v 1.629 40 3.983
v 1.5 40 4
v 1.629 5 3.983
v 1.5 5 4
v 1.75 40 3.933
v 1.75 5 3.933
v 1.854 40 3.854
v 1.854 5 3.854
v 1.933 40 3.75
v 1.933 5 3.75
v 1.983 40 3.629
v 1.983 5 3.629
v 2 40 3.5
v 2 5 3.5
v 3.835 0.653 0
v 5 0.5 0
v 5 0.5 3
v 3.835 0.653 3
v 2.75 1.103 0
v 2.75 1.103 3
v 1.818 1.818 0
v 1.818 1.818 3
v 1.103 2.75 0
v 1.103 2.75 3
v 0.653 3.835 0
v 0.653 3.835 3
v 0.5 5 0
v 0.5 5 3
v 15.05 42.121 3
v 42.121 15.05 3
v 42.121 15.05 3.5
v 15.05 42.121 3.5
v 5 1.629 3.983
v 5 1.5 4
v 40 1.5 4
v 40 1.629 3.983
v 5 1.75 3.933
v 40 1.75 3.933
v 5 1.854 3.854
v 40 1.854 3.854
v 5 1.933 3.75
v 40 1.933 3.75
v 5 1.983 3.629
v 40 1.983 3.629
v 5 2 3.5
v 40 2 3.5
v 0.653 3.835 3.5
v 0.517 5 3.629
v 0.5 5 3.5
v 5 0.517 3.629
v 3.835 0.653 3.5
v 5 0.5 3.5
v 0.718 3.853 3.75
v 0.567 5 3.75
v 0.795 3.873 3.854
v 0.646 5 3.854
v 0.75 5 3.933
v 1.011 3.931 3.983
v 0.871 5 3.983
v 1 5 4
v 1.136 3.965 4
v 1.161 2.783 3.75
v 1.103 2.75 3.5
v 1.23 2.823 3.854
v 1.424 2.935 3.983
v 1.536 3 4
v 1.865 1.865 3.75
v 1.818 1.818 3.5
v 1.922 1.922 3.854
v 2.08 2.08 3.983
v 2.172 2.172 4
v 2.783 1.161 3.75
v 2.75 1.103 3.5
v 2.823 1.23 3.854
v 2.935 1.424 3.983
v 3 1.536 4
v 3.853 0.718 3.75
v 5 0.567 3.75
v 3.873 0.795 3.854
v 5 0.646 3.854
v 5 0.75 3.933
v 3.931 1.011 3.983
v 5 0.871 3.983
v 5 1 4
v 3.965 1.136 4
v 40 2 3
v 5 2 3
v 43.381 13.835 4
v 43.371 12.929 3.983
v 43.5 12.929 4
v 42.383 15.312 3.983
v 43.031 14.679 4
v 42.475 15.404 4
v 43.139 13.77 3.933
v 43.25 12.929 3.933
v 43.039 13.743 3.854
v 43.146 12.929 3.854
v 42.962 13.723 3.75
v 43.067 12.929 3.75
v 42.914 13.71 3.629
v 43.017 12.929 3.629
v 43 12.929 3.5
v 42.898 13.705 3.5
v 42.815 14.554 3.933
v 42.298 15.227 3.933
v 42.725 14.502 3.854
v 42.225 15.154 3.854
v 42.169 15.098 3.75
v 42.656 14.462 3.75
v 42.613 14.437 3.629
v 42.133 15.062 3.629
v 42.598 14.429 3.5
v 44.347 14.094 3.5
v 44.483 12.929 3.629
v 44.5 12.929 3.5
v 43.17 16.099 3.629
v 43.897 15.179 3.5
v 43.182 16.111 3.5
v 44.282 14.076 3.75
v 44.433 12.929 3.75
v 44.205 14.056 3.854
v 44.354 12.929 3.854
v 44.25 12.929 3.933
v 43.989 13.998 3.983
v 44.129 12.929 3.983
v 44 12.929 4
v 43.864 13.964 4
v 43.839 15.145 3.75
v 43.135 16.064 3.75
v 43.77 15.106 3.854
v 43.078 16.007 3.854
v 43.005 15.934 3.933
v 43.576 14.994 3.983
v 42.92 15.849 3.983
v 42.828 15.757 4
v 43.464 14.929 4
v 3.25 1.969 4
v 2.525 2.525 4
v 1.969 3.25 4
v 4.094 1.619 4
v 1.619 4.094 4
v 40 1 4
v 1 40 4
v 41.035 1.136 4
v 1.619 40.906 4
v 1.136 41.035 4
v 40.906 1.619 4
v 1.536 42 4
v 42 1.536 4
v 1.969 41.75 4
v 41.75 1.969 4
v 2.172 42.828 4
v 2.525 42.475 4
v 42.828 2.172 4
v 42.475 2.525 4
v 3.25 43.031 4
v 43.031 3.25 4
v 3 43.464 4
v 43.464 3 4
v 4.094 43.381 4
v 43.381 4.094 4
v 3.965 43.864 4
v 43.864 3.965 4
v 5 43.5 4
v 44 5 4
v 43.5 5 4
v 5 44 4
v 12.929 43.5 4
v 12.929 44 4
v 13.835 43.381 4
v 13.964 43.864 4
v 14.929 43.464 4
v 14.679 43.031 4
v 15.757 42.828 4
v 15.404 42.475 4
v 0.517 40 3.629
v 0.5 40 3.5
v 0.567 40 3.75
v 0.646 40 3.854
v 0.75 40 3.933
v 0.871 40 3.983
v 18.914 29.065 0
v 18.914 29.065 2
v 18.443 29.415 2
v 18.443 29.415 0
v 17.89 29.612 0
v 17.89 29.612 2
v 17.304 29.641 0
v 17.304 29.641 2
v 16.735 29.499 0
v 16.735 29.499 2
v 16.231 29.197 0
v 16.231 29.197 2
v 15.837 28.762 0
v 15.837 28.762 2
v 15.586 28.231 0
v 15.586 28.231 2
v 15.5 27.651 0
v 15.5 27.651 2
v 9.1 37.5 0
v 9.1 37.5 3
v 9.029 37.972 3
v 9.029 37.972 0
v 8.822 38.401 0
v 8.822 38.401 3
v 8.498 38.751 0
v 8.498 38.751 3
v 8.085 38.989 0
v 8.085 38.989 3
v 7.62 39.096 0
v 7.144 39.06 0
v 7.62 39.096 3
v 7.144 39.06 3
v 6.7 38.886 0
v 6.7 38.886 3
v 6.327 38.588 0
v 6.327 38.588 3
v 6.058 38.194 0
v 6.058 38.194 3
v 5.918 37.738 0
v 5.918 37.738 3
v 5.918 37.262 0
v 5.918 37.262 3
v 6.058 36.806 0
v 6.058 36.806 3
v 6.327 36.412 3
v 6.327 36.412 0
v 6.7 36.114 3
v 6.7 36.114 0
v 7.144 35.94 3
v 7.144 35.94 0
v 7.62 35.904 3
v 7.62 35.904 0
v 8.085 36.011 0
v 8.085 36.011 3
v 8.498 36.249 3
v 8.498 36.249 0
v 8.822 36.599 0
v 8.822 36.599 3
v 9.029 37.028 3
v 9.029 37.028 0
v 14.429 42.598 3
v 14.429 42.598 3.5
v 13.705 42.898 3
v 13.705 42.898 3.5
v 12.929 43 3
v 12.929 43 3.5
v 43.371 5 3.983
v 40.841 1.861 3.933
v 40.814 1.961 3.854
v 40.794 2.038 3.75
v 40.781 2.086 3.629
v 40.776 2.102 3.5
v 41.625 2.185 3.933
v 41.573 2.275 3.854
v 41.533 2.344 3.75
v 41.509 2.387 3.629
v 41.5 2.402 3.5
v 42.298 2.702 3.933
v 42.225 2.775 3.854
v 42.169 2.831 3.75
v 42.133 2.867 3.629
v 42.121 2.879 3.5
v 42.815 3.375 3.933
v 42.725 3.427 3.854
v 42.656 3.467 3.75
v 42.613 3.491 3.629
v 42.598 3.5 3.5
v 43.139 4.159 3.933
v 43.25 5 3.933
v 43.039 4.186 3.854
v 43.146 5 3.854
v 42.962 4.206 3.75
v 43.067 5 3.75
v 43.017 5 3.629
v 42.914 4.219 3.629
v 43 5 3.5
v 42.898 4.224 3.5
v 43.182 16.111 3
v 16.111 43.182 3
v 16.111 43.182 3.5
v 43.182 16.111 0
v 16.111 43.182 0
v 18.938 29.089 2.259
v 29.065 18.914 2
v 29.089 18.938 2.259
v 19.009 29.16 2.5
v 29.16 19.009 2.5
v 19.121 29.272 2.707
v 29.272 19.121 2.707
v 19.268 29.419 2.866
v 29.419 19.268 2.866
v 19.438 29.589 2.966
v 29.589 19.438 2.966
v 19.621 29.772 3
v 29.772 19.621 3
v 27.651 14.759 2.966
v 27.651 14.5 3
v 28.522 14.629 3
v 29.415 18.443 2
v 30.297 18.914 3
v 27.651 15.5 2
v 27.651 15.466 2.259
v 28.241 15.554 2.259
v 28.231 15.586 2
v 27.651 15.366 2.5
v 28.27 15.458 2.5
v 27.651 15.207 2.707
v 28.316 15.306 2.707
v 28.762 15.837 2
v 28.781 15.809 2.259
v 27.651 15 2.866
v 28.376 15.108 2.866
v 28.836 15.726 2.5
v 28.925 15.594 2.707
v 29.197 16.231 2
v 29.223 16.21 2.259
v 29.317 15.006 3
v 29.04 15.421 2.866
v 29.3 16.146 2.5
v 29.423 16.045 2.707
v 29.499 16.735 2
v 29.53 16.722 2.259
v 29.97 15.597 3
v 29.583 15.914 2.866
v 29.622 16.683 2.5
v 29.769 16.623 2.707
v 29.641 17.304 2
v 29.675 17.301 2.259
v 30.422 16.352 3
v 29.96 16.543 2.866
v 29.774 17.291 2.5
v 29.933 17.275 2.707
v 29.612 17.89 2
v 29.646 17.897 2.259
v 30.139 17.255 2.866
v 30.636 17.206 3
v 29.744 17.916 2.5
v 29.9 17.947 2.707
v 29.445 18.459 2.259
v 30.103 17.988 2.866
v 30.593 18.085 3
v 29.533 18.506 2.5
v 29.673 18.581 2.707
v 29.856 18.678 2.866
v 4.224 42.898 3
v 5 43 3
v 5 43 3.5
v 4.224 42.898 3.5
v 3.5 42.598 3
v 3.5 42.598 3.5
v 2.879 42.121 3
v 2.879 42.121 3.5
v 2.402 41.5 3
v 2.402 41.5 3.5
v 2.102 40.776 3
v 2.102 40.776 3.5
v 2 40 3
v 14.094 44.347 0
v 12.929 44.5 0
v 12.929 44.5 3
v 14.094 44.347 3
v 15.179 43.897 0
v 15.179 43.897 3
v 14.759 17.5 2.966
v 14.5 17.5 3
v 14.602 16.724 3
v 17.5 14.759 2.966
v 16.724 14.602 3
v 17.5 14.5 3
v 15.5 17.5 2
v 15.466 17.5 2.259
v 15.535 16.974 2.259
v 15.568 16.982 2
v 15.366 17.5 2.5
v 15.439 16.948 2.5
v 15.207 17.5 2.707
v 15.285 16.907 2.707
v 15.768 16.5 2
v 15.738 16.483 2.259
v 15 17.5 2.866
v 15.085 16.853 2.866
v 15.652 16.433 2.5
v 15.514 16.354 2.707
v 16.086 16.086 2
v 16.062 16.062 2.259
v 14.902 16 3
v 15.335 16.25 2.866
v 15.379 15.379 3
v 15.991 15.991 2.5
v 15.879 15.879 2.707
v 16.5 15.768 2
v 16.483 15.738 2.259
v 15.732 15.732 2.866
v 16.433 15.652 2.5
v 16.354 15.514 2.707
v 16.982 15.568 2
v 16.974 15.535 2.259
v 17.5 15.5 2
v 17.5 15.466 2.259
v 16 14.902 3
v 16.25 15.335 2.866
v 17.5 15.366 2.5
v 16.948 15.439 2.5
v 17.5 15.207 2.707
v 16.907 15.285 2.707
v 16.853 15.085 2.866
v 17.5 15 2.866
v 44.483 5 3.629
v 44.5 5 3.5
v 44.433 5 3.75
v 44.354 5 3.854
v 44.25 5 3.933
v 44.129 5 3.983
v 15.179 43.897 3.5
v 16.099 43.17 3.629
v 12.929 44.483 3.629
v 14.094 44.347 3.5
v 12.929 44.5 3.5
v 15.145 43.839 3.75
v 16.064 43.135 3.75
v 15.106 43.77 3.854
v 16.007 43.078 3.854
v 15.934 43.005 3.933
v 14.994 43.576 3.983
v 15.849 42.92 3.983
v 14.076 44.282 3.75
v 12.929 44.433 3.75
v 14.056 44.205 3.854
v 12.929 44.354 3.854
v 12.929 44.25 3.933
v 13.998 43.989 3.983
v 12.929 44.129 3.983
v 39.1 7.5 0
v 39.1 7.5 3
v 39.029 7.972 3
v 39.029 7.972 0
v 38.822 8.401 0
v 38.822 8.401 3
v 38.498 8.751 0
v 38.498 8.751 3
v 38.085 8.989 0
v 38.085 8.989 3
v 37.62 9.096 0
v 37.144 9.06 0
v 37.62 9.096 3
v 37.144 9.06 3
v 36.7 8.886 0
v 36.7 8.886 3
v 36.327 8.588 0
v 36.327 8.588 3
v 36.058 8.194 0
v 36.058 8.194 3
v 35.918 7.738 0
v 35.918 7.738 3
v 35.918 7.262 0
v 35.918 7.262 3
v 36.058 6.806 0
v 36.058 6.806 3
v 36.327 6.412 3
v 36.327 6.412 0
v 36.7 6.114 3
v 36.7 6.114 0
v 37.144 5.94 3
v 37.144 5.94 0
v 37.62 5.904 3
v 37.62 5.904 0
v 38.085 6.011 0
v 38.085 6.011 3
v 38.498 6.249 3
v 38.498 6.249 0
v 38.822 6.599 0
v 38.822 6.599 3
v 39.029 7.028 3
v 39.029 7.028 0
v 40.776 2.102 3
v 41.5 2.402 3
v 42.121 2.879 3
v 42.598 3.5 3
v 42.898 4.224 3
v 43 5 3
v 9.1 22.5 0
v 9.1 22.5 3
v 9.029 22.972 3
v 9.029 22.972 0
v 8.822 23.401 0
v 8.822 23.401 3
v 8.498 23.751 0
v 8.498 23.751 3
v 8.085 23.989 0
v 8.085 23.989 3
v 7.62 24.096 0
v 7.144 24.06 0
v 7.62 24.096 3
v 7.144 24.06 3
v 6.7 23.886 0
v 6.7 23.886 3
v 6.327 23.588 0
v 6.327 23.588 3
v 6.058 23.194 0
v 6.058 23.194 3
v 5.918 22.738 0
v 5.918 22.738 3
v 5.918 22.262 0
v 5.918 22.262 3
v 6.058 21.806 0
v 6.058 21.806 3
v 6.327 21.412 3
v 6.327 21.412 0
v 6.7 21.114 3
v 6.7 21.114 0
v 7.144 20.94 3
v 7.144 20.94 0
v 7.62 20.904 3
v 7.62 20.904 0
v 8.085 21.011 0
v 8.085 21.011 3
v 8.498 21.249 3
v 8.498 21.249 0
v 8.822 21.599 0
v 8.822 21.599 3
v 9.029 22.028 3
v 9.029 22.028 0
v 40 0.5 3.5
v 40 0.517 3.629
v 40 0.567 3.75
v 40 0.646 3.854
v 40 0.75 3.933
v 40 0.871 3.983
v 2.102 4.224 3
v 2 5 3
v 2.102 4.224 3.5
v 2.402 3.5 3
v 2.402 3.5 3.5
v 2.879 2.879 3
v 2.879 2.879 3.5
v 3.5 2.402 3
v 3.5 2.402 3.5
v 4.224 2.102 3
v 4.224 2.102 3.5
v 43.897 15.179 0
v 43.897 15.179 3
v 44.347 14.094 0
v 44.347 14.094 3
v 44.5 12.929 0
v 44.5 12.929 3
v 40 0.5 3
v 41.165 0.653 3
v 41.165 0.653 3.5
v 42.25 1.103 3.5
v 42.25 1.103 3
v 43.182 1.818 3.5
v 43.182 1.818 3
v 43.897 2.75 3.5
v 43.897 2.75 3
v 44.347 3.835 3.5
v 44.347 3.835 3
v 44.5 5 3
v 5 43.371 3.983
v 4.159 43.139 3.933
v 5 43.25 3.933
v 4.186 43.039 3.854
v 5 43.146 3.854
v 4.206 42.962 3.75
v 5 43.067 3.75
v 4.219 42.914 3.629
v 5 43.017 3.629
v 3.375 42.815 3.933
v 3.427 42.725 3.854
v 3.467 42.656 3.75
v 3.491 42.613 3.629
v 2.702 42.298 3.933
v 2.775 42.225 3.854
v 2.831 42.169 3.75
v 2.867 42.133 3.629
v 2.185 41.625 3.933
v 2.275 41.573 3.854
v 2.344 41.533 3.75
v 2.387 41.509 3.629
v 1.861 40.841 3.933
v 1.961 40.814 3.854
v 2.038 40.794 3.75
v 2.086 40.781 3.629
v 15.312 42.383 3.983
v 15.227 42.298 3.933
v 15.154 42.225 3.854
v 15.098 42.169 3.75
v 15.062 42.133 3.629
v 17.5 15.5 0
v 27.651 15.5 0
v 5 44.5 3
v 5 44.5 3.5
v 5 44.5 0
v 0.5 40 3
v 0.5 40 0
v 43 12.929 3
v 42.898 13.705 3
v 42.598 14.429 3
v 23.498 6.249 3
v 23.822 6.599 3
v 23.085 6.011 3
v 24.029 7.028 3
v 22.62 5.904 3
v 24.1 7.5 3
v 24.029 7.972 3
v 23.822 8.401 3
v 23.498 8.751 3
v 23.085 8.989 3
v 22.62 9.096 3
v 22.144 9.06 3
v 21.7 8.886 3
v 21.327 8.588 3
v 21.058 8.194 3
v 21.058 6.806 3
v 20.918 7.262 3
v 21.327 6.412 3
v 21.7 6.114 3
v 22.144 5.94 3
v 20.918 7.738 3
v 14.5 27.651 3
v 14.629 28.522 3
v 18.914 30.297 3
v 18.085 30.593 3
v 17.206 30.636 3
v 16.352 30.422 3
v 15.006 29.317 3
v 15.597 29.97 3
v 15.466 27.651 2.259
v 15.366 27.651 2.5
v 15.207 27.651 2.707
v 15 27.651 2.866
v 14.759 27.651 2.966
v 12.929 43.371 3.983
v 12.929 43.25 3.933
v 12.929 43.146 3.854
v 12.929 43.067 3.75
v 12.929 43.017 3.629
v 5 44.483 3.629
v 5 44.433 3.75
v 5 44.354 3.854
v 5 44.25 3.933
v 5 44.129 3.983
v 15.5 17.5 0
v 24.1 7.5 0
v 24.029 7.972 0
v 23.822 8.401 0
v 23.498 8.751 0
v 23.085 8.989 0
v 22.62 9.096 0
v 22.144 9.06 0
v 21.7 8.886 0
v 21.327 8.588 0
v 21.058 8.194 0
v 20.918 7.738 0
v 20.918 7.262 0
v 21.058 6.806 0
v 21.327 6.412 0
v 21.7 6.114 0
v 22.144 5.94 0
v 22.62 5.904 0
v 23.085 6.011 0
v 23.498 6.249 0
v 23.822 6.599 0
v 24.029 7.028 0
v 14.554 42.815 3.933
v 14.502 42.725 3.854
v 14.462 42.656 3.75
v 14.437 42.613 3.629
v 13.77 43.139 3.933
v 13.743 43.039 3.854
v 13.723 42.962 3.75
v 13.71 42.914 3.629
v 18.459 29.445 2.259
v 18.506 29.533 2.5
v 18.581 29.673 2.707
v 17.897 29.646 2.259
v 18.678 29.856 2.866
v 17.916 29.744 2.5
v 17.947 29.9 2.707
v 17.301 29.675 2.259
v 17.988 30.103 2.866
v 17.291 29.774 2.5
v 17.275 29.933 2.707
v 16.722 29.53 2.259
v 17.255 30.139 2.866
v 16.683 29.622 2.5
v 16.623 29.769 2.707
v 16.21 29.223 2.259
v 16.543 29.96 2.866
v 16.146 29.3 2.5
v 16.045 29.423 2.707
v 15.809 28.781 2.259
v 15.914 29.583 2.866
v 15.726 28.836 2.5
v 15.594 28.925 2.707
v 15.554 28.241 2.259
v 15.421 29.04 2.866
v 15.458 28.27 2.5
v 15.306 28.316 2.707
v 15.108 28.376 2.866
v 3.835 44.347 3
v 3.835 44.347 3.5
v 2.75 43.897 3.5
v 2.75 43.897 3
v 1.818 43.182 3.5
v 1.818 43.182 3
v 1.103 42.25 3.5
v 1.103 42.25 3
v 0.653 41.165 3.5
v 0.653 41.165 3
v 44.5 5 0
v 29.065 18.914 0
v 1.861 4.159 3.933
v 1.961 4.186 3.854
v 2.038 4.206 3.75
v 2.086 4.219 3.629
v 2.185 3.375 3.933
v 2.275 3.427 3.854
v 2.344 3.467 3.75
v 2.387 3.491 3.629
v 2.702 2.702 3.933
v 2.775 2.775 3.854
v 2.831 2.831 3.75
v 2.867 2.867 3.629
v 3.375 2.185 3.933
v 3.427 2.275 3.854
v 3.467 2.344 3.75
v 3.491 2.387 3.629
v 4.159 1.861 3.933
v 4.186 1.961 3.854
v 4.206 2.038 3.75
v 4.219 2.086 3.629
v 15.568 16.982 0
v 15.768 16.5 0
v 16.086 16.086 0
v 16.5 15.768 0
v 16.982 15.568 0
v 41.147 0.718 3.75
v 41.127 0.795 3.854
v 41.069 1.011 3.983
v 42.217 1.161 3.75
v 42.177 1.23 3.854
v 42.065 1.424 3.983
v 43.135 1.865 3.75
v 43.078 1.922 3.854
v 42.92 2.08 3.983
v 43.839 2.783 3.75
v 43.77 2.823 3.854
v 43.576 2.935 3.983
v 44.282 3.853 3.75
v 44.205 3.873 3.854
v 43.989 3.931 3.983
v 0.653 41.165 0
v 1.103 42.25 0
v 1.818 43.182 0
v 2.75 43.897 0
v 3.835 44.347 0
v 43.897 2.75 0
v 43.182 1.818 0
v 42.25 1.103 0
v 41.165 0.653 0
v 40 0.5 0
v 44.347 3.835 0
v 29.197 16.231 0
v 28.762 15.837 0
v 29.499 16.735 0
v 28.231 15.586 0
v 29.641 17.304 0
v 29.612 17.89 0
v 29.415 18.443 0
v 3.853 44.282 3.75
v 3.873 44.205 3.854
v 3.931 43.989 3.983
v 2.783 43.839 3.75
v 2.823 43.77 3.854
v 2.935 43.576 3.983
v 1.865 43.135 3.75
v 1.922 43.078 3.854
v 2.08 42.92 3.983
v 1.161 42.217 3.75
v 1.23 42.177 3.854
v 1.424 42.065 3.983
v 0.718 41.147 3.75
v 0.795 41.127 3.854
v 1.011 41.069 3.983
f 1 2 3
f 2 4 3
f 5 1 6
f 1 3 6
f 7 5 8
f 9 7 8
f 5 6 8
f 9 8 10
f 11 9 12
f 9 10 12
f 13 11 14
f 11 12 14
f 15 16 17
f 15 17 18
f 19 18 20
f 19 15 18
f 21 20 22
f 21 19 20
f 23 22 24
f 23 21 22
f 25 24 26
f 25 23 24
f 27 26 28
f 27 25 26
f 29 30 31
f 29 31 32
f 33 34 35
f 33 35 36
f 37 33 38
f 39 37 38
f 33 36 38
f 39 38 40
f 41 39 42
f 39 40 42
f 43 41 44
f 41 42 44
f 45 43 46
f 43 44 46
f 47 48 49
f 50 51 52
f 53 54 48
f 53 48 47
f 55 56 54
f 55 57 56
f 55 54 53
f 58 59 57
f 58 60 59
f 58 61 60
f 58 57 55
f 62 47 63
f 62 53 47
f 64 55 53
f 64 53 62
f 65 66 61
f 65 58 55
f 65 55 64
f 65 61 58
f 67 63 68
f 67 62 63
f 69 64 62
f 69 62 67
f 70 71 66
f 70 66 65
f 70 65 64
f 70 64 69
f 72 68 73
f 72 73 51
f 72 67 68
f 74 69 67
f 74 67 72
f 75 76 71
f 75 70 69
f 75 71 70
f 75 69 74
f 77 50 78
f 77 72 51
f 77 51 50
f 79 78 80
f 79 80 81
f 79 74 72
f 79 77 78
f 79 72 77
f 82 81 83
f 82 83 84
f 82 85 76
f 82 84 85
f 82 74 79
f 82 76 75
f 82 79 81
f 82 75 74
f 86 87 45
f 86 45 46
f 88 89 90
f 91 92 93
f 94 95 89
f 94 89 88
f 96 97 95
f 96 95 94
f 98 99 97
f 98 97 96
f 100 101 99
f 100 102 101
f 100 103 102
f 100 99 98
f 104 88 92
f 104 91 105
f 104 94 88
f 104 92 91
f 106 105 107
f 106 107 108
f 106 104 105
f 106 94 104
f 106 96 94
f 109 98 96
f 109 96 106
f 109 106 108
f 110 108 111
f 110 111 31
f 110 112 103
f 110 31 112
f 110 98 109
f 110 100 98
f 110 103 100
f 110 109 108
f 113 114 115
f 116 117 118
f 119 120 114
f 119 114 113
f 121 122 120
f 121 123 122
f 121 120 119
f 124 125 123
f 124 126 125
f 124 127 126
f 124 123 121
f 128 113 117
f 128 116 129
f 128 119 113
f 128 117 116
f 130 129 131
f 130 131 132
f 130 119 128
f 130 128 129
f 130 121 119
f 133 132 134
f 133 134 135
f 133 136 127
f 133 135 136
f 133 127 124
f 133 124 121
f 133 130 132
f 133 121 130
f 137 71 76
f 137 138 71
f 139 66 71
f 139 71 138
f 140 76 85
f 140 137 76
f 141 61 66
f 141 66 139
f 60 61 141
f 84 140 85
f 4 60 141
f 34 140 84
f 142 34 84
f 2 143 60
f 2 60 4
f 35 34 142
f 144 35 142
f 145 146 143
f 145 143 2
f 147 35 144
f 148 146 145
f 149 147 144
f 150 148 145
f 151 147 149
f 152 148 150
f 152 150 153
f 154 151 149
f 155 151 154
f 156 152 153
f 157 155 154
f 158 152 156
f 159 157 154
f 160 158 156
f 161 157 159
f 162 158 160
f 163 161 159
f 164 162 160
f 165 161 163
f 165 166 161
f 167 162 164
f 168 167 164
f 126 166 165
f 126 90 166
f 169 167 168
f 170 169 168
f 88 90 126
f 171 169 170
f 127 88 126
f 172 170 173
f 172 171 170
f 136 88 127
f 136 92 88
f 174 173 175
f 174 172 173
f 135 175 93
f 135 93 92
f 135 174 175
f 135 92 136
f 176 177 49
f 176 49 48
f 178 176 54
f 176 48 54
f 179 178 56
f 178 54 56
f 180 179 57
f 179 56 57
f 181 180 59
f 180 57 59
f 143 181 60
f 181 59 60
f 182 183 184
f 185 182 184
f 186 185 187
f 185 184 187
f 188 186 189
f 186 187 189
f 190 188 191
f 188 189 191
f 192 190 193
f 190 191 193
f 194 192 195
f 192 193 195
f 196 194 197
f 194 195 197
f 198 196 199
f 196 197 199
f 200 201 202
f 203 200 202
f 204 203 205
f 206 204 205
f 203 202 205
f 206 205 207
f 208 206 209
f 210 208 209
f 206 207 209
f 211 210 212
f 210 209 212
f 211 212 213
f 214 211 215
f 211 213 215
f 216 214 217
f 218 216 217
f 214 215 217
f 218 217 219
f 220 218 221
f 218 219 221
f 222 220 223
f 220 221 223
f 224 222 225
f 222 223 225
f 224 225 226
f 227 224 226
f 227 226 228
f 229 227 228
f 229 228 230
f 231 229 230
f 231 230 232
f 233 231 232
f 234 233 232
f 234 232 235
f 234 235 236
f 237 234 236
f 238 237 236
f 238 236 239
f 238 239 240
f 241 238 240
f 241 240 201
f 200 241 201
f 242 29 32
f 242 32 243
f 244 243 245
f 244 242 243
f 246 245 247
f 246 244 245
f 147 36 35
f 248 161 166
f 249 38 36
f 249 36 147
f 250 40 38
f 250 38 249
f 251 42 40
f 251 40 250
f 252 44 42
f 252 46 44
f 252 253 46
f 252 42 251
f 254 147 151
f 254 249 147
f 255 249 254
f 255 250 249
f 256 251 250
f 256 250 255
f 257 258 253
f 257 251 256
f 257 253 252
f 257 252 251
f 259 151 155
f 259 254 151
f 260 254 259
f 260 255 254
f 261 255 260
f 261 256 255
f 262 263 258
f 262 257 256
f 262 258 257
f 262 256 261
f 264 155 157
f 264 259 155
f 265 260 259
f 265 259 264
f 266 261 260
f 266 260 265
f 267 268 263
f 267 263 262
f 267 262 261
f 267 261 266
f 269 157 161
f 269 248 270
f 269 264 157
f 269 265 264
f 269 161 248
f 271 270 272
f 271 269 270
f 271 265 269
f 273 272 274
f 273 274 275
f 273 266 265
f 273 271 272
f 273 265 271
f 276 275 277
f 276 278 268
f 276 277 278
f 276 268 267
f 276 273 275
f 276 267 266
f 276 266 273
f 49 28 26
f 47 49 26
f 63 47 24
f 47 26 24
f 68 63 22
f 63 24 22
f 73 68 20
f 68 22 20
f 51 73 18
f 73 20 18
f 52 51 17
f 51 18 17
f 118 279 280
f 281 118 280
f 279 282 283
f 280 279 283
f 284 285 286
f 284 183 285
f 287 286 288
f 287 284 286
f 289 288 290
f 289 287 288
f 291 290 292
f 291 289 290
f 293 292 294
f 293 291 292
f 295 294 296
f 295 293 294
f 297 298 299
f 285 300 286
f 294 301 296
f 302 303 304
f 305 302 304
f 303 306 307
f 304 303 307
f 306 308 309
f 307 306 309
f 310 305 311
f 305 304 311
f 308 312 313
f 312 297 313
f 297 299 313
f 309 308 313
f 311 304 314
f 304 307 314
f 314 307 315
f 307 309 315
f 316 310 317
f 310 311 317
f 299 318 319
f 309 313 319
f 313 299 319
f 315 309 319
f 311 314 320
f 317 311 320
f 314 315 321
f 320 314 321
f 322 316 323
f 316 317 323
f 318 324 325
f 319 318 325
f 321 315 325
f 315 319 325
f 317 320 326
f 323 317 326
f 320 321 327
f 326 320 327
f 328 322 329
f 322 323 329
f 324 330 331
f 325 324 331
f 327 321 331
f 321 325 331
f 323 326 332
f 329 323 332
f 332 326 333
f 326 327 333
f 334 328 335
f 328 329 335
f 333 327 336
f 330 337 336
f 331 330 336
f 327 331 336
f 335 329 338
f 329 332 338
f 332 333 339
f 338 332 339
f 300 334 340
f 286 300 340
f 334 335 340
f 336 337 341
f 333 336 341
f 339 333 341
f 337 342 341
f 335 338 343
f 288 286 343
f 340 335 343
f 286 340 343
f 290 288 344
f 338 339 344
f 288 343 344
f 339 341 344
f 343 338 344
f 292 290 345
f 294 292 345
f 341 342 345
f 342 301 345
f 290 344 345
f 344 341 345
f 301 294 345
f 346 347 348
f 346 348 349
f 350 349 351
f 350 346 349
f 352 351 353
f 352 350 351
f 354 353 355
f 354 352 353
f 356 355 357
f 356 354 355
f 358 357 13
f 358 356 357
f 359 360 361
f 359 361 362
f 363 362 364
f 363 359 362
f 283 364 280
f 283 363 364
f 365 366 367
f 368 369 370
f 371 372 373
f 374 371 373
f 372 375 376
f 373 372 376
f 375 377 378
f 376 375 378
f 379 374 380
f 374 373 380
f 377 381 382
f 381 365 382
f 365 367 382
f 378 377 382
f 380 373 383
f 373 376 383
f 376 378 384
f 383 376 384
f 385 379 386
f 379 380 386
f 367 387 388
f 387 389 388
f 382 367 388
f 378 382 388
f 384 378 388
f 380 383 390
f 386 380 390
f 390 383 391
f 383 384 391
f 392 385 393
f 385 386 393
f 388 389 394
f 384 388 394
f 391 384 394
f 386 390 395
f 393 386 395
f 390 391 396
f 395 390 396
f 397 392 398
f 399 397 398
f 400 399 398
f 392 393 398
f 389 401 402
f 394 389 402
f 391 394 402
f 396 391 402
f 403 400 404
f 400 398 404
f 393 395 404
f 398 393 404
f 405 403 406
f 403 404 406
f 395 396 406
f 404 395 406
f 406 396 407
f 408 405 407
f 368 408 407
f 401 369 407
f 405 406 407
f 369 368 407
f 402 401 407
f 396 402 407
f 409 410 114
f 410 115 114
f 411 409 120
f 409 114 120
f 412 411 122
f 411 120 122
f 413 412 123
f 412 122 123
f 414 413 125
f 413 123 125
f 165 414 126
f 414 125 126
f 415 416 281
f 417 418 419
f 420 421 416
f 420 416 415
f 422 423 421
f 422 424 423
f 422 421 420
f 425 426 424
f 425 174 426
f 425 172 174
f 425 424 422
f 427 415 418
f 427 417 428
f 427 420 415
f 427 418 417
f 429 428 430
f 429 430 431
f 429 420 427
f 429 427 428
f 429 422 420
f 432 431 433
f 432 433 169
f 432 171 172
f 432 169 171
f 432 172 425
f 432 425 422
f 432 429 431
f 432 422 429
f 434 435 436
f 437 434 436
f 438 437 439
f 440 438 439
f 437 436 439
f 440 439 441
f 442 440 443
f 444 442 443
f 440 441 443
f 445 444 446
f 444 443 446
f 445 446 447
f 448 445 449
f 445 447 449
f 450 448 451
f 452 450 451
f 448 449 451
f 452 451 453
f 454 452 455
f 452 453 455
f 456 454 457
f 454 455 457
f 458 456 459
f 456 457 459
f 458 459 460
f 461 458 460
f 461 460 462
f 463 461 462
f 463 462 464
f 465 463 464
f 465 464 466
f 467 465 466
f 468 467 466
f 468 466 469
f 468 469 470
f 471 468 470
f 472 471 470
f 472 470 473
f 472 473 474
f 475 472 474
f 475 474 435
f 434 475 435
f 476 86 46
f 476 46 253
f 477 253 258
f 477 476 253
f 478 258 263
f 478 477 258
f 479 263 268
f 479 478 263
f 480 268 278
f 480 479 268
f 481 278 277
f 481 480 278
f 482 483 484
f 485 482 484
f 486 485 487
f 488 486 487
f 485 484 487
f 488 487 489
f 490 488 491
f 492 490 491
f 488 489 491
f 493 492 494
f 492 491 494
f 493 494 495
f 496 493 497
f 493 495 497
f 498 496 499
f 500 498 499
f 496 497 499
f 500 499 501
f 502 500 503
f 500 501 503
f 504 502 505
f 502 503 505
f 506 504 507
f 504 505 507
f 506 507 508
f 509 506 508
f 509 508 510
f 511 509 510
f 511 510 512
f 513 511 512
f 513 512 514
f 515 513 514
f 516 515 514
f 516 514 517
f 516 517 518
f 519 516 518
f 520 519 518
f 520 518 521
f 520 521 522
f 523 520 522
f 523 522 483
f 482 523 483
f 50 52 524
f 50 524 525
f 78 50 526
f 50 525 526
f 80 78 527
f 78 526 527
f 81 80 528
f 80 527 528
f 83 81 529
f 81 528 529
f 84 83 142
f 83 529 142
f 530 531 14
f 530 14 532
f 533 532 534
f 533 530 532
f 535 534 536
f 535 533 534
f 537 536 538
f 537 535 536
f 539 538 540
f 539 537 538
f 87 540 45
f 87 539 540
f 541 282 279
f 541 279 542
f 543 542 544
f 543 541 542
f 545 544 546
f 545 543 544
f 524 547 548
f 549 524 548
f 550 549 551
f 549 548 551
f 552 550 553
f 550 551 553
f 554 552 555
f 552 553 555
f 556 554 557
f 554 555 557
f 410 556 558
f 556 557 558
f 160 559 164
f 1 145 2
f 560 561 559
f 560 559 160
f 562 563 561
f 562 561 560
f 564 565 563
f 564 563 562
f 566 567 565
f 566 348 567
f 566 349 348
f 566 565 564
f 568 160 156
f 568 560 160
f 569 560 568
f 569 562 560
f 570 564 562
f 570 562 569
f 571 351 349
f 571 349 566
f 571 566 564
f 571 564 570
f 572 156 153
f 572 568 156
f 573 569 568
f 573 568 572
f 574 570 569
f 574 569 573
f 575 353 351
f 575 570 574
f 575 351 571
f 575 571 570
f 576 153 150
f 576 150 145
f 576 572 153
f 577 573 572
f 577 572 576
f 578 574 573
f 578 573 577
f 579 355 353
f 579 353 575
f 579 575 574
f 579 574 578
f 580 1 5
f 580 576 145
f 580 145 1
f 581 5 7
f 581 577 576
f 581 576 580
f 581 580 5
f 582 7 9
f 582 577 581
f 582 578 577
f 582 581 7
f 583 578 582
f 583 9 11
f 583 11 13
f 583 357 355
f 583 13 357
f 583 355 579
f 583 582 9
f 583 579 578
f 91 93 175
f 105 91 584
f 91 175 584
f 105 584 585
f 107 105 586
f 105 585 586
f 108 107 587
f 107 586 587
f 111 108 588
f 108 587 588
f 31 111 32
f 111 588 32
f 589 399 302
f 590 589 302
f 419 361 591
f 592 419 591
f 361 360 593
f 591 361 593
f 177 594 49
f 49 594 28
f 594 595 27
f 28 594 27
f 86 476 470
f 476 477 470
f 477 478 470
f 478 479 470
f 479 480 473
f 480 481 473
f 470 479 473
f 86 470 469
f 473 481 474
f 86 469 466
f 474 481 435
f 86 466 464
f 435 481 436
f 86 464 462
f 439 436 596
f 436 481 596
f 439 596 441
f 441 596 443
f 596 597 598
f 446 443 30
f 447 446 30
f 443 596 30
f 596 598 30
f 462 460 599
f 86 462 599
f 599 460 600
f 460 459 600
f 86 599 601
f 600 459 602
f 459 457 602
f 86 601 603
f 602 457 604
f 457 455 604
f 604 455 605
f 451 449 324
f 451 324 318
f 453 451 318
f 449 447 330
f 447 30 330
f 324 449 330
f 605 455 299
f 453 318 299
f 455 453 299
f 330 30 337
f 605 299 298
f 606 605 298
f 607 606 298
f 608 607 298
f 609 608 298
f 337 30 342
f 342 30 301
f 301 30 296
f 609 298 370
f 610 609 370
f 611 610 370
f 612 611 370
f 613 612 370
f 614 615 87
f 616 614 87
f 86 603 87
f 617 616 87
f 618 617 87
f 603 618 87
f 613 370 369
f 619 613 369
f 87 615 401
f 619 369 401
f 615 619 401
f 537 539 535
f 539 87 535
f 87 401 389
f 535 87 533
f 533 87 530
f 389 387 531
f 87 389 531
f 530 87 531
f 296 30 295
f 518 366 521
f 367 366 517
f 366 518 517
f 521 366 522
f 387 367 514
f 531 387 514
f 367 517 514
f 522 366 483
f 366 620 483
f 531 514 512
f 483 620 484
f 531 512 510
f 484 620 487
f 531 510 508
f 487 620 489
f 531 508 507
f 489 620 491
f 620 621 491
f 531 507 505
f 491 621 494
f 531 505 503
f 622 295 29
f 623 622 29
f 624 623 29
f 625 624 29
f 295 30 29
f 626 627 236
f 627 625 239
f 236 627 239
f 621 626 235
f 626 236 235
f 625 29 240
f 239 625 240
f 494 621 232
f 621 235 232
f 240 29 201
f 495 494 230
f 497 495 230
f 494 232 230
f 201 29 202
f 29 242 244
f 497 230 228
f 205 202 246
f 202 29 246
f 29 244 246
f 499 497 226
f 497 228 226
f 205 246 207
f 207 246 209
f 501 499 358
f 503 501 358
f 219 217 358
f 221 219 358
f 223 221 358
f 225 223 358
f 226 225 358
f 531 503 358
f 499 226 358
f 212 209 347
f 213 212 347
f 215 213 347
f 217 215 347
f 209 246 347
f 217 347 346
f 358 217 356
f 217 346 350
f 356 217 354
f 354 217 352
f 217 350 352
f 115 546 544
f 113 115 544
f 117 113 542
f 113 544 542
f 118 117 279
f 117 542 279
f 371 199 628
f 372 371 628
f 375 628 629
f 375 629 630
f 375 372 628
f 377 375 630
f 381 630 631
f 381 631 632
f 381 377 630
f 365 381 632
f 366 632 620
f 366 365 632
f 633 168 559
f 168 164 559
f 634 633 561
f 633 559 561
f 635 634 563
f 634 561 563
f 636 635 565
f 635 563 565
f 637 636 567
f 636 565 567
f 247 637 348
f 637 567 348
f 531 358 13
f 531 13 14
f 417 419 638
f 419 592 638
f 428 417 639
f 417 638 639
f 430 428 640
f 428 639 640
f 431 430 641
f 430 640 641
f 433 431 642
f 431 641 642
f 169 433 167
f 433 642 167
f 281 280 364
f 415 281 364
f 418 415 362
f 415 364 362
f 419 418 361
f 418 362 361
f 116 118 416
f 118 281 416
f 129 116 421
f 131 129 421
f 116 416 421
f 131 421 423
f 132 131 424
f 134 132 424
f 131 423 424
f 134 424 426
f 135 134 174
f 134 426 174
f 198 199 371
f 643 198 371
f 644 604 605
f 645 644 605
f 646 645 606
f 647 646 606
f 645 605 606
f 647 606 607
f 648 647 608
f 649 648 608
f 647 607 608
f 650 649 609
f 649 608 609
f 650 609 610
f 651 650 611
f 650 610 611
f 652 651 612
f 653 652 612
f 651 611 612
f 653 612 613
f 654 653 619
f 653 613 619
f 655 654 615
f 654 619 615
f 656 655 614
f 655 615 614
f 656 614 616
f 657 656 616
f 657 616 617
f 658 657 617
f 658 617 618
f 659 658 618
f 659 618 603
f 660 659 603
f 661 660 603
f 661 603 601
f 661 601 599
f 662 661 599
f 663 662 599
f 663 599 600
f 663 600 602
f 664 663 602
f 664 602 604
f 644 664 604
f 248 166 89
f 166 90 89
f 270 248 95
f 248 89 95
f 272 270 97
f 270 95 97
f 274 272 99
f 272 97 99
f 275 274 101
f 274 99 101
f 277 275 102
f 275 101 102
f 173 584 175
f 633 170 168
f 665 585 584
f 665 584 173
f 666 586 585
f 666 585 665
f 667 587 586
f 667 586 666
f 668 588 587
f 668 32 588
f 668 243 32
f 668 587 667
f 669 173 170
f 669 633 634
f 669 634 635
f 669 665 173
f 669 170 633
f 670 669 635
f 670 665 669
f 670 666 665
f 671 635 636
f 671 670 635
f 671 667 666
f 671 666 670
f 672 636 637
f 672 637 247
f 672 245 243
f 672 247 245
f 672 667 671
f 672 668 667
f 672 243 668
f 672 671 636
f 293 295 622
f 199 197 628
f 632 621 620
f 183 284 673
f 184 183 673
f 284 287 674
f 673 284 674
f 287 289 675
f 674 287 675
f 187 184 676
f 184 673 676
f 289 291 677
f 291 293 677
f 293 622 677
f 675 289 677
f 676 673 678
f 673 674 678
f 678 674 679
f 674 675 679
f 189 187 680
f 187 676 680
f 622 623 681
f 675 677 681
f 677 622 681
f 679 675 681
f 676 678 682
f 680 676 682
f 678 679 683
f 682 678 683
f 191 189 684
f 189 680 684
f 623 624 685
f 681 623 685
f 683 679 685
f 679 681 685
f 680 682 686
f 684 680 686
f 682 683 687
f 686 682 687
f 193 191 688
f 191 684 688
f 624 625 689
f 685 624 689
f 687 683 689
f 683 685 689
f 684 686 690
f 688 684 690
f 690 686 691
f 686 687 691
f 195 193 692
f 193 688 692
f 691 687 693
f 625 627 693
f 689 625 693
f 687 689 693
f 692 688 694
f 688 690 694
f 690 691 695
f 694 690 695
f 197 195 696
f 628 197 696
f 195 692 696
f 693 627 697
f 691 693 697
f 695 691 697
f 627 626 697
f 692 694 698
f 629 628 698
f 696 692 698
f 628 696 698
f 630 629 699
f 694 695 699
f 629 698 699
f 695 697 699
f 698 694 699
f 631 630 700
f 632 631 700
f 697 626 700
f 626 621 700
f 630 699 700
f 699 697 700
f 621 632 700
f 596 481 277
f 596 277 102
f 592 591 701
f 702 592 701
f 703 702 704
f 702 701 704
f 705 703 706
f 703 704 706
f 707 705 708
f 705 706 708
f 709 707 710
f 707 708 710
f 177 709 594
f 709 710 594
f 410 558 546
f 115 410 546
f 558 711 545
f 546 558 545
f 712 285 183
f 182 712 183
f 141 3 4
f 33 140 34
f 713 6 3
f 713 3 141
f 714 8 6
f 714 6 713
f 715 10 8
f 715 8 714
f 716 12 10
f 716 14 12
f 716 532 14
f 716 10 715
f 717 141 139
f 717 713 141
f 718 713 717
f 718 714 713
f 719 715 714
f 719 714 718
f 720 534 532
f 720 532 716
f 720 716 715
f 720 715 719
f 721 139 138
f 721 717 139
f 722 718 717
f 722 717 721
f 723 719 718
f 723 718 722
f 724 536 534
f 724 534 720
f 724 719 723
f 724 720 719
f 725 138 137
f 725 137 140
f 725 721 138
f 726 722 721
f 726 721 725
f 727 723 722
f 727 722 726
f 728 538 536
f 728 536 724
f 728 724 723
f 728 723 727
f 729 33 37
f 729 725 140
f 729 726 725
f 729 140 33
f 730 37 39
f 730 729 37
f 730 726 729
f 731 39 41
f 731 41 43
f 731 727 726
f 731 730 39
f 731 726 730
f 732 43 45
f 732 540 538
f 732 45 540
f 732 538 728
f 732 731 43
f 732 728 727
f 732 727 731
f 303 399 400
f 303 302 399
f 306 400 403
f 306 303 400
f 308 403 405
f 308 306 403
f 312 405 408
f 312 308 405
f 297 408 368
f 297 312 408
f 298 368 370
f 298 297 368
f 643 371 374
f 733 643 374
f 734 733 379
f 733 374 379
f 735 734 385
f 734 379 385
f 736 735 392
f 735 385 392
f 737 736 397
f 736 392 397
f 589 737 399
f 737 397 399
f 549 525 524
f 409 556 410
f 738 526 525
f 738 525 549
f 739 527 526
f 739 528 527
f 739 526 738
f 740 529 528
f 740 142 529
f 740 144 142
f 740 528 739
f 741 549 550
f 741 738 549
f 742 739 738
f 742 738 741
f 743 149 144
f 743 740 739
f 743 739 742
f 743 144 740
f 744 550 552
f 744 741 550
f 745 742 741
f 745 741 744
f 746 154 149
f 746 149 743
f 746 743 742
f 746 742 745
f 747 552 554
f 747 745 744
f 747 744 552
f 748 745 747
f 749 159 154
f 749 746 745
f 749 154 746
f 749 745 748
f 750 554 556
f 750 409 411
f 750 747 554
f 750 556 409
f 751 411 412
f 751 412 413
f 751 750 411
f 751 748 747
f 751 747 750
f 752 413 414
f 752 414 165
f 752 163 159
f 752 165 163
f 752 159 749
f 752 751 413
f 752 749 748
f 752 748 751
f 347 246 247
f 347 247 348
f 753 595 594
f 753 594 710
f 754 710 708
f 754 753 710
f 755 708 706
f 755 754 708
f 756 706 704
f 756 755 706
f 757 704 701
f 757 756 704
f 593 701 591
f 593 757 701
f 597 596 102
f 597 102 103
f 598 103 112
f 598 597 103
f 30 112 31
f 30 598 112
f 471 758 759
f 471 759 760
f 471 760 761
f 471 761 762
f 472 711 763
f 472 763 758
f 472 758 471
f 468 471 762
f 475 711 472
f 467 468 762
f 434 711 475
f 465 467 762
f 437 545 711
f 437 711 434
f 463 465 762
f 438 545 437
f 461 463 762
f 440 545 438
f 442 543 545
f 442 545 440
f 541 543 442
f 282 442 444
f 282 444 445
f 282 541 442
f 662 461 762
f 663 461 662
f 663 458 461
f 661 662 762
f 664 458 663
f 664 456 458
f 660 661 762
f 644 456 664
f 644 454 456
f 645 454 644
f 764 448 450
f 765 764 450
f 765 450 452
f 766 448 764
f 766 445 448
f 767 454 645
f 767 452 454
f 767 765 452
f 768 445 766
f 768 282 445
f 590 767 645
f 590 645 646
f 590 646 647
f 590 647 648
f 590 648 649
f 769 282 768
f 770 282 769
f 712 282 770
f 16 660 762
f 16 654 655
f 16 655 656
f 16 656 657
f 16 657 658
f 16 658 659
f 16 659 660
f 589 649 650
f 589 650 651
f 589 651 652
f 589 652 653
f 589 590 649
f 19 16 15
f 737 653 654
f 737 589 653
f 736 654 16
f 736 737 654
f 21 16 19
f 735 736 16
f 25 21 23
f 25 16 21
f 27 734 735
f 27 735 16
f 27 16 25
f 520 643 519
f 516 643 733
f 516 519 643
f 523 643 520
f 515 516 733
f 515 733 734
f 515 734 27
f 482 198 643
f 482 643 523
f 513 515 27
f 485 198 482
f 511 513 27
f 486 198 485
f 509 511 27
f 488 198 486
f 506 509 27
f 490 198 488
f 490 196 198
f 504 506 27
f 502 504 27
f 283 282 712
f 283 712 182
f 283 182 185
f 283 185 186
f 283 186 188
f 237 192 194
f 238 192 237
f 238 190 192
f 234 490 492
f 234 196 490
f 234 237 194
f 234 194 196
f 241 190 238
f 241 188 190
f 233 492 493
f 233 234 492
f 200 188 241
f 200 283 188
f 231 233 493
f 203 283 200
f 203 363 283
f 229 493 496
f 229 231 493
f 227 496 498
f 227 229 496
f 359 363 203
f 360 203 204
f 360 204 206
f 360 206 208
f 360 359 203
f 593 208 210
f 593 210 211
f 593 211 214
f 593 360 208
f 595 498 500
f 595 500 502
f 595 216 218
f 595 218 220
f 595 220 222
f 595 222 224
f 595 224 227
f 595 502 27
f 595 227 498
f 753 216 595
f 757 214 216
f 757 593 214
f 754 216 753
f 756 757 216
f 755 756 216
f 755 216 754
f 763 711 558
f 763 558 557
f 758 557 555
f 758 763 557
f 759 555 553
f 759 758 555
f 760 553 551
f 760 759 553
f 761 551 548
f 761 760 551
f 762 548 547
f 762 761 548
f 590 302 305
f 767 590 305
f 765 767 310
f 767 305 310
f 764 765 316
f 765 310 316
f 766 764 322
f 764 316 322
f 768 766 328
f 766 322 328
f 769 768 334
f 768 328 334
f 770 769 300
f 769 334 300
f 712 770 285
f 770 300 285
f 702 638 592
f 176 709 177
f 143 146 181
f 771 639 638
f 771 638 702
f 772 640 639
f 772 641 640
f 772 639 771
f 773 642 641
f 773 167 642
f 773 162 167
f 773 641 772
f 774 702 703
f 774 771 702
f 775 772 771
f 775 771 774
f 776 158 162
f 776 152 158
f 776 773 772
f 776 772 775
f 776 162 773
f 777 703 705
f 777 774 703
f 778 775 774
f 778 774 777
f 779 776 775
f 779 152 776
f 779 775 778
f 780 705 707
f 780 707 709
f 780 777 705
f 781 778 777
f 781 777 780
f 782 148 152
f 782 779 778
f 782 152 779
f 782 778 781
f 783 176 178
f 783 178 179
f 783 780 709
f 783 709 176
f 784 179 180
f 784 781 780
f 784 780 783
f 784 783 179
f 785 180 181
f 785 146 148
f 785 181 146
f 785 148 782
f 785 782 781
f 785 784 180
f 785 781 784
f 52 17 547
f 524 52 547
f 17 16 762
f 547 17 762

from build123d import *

# Parameters (mm, degrees)
BOSS_EXTRUDE1_DEPTH = 3
SKETCH2_R           = 1.6
CUT_EXTRUDE1_DEPTH  = 64.710281745
MOVE_FACE1_BY       = 0.5
MOVE_FACE1_2_BY     = 0.5
MOVE_FACE1_3_BY     = 0.5
MOVE_FACE1_4_BY     = 0.5
MOVE_FACE1_5_BY     = 0.5
MOVE_FACE1_6_BY     = 0.5
MOVE_FACE1_7_BY     = 0.5
MOVE_FACE1_8_BY     = 0.5
MOVE_FACE1_9_BY     = 0.5
MOVE_FACE1_10_BY    = 0.5
BOSS_EXTRUDE2_DEPTH = 1
FILLET1_R           = 0.5
CUT_EXTRUDE2_DEPTH  = 64.003968129
FILLET2_R           = 1


with BuildPart() as part:
    # Sketch1 → Boss-Extrude1 (new body)
    with BuildSketch(Plane.XY):
        with BuildLine():
            Line((16.464466094, 43.535533906), (43.535533906, 16.464466094))
            ThreePointArc((43.535533906, 16.464466094), (44.619397663, 14.84234935), (45, 12.928932188))
            Line((45, 12.928932188), (45, 5))
            ThreePointArc((45, 5), (43.535533906, 1.464466094), (40, 0))
            Line((40, 0), (5, 0))
            ThreePointArc((5, 0), (1.464466094, 1.464466094), (0, 5))
            Line((0, 5), (0, 40))
            ThreePointArc((0, 40), (1.464466094, 43.535533906), (5, 45))
            Line((5, 45), (12.928932188, 45))
            ThreePointArc((12.928932188, 45), (14.84234935, 44.619397663), (16.464466094, 43.535533906))
        make_face()
    extrude(amount=BOSS_EXTRUDE1_DEPTH)

    # Sketch2 → Cut-Extrude1 (cut, through all)
    with BuildSketch(Plane.XY.offset(3)):
        with Locations((7.5, 37.5)):
            Circle(SKETCH2_R)
        with Locations((7.5, 22.5)):
            Circle(SKETCH2_R)
        with Locations((22.5, 7.5)):
            Circle(SKETCH2_R)
        with Locations((37.5, 7.5)):
            Circle(SKETCH2_R)
    extrude(amount=-CUT_EXTRUDE1_DEPTH, mode=Mode.SUBTRACT)

    # Move Face1: a curved face moved inward by 0.5
    add(Solid.thicken(part.faces().sort_by_distance((1.464466094, 1.464466094, 1.5))[0], -MOVE_FACE1_BY), mode=Mode.SUBTRACT)

    # Move Face1 2: a face moved inward by 0.5
    extrude(part.faces().sort_by_distance((22.5, 0, 1.5))[0], amount=MOVE_FACE1_2_BY, dir=(0, 1, 0), mode=Mode.SUBTRACT)

    # Move Face1 3: a curved face moved inward by 0.5
    add(Solid.thicken(part.faces().sort_by_distance((43.535533906, 1.464466094, 1.5))[0], -MOVE_FACE1_3_BY), mode=Mode.SUBTRACT)

    # Move Face1 4: a face moved inward by 0.5
    extrude(part.faces().sort_by_distance((45, 8.964466094, 1.5))[0], amount=MOVE_FACE1_4_BY, dir=(-1, 0, 0), mode=Mode.SUBTRACT)

    # Move Face1 5: a curved face moved inward by 0.5
    add(Solid.thicken(part.faces().sort_by_distance((44.619397663, 14.84234935, 1.5))[0], -MOVE_FACE1_5_BY), mode=Mode.SUBTRACT)

    # Move Face1 6: a face moved inward by 0.5
    extrude(part.faces().sort_by_distance((30, 30, 1.5))[0], amount=MOVE_FACE1_6_BY, dir=(-0.707106781, -0.707106781, 0), mode=Mode.SUBTRACT)

    # Move Face1 7: a curved face moved inward by 0.5
    add(Solid.thicken(part.faces().sort_by_distance((14.84234935, 44.619397663, 1.5))[0], -MOVE_FACE1_7_BY), mode=Mode.SUBTRACT)

    # Move Face1 8: a face moved inward by 0.5
    extrude(part.faces().sort_by_distance((8.964466094, 45, 1.5))[0], amount=MOVE_FACE1_8_BY, dir=(0, -1, 0), mode=Mode.SUBTRACT)

    # Move Face1 9: a curved face moved inward by 0.5
    add(Solid.thicken(part.faces().sort_by_distance((1.464466094, 43.535533906, 1.5))[0], -MOVE_FACE1_9_BY), mode=Mode.SUBTRACT)

    # Move Face1 10: a face moved inward by 0.5
    extrude(part.faces().sort_by_distance((0, 22.5, 1.5))[0], amount=MOVE_FACE1_10_BY, dir=(1, 0, 0), mode=Mode.SUBTRACT)

    # Sketch3 → Boss-Extrude2 (add)
    with BuildSketch(Plane.XY.offset(3)):
        with BuildLine():
            Line((5, 0.5), (40, 0.5))
            ThreePointArc((40, 0.5), (43.181980515, 1.818019485), (44.5, 5))
            Line((44.5, 5), (44.5, 12.928932188))
            ThreePointArc((44.5, 12.928932188), (44.157457896, 14.651007634), (43.181980515, 16.110912703))
            Line((43.181980515, 16.110912703), (16.110912703, 43.181980515))
            ThreePointArc((16.110912703, 43.181980515), (14.651007634, 44.157457896), (12.928932188, 44.5))
            Line((12.928932188, 44.5), (5, 44.5))
            ThreePointArc((5, 44.5), (1.818019485, 43.181980515), (0.5, 40))
            Line((0.5, 40), (0.5, 5))
            ThreePointArc((0.5, 5), (1.818019485, 1.818019485), (5, 0.5))
        make_face()
        with BuildLine():
            Line((5, 2), (40, 2))
            ThreePointArc((40, 2), (42.121320344, 2.878679656), (43, 5))
            Line((43, 5), (43, 12.928932188))
            ThreePointArc((43, 12.928932188), (42.771638598, 14.076982485), (42.121320344, 15.050252532))
            Line((42.121320344, 15.050252532), (15.050252532, 42.121320344))
            ThreePointArc((15.050252532, 42.121320344), (14.076982485, 42.771638598), (12.928932188, 43))
            Line((12.928932188, 43), (5, 43))
            ThreePointArc((5, 43), (2.878679656, 42.121320344), (2, 40))
            Line((2, 40), (2, 5))
            ThreePointArc((2, 5), (2.878679656, 2.878679656), (5, 2))
        make_face(mode=Mode.SUBTRACT)
    extrude(amount=BOSS_EXTRUDE2_DEPTH)

    # Fillet1
    fillet1_edges = [part.edges().sort_by_distance(p)[0] for p in [
        (1.818019485, 1.818019485, 4),
        (22.5, 0.5, 4),
        (43.181980515, 1.818019485, 4),
        (44.5, 8.964466094, 4),
        (44.157457896, 14.651007634, 4),
        (29.646446609, 29.646446609, 4),
        (14.651007634, 44.157457896, 4),
        (8.964466094, 44.5, 4),
        (1.818019485, 43.181980515, 4),
        (0.5, 22.5, 4),
        (2.878679656, 2.878679656, 4),
        (22.5, 2, 4),
        (42.121320344, 2.878679656, 4),
        (43, 8.964466094, 4),
        (42.771638598, 14.076982485, 4),
        (28.585786438, 28.585786438, 4),
        (14.076982485, 42.771638598, 4),
        (8.964466094, 43, 4),
        (2.878679656, 42.121320344, 4),
        (2, 22.5, 4),
    ]]
    fillet(fillet1_edges, radius=FILLET1_R)

    # Sketch4 → Cut-Extrude2 (cut, through all)
    with BuildSketch(Plane.XY.offset(3)):
        with BuildLine():
            Line((15.5, 27.650757595), (15.5, 17.5))
            ThreePointArc((15.5, 17.5), (16.085786438, 16.085786438), (17.5, 15.5))
            Line((17.5, 15.5), (27.650757595, 15.5))
            ThreePointArc((27.650757595, 15.5), (29.49851666, 16.734633135), (29.064971157, 18.914213562))
            Line((29.064971157, 18.914213562), (18.914213562, 29.064971157))
            ThreePointArc((18.914213562, 29.064971157), (16.734633135, 29.49851666), (15.5, 27.650757595))
        make_face()
    extrude(amount=-CUT_EXTRUDE2_DEPTH, mode=Mode.SUBTRACT)

    # Fillet2
    fillet2_edges = [part.edges().sort_by_distance(p)[0] for p in [
        (16.085786438, 16.085786438, 3),
        (22.575378798, 15.5, 3),
        (29.49851666, 16.734633135, 3),
        (23.98959236, 23.98959236, 3),
        (16.734633135, 29.49851666, 3),
        (15.5, 22.575378798, 3),
    ]]
    fillet(fillet2_edges, radius=FILLET2_R)


solid = part.part
